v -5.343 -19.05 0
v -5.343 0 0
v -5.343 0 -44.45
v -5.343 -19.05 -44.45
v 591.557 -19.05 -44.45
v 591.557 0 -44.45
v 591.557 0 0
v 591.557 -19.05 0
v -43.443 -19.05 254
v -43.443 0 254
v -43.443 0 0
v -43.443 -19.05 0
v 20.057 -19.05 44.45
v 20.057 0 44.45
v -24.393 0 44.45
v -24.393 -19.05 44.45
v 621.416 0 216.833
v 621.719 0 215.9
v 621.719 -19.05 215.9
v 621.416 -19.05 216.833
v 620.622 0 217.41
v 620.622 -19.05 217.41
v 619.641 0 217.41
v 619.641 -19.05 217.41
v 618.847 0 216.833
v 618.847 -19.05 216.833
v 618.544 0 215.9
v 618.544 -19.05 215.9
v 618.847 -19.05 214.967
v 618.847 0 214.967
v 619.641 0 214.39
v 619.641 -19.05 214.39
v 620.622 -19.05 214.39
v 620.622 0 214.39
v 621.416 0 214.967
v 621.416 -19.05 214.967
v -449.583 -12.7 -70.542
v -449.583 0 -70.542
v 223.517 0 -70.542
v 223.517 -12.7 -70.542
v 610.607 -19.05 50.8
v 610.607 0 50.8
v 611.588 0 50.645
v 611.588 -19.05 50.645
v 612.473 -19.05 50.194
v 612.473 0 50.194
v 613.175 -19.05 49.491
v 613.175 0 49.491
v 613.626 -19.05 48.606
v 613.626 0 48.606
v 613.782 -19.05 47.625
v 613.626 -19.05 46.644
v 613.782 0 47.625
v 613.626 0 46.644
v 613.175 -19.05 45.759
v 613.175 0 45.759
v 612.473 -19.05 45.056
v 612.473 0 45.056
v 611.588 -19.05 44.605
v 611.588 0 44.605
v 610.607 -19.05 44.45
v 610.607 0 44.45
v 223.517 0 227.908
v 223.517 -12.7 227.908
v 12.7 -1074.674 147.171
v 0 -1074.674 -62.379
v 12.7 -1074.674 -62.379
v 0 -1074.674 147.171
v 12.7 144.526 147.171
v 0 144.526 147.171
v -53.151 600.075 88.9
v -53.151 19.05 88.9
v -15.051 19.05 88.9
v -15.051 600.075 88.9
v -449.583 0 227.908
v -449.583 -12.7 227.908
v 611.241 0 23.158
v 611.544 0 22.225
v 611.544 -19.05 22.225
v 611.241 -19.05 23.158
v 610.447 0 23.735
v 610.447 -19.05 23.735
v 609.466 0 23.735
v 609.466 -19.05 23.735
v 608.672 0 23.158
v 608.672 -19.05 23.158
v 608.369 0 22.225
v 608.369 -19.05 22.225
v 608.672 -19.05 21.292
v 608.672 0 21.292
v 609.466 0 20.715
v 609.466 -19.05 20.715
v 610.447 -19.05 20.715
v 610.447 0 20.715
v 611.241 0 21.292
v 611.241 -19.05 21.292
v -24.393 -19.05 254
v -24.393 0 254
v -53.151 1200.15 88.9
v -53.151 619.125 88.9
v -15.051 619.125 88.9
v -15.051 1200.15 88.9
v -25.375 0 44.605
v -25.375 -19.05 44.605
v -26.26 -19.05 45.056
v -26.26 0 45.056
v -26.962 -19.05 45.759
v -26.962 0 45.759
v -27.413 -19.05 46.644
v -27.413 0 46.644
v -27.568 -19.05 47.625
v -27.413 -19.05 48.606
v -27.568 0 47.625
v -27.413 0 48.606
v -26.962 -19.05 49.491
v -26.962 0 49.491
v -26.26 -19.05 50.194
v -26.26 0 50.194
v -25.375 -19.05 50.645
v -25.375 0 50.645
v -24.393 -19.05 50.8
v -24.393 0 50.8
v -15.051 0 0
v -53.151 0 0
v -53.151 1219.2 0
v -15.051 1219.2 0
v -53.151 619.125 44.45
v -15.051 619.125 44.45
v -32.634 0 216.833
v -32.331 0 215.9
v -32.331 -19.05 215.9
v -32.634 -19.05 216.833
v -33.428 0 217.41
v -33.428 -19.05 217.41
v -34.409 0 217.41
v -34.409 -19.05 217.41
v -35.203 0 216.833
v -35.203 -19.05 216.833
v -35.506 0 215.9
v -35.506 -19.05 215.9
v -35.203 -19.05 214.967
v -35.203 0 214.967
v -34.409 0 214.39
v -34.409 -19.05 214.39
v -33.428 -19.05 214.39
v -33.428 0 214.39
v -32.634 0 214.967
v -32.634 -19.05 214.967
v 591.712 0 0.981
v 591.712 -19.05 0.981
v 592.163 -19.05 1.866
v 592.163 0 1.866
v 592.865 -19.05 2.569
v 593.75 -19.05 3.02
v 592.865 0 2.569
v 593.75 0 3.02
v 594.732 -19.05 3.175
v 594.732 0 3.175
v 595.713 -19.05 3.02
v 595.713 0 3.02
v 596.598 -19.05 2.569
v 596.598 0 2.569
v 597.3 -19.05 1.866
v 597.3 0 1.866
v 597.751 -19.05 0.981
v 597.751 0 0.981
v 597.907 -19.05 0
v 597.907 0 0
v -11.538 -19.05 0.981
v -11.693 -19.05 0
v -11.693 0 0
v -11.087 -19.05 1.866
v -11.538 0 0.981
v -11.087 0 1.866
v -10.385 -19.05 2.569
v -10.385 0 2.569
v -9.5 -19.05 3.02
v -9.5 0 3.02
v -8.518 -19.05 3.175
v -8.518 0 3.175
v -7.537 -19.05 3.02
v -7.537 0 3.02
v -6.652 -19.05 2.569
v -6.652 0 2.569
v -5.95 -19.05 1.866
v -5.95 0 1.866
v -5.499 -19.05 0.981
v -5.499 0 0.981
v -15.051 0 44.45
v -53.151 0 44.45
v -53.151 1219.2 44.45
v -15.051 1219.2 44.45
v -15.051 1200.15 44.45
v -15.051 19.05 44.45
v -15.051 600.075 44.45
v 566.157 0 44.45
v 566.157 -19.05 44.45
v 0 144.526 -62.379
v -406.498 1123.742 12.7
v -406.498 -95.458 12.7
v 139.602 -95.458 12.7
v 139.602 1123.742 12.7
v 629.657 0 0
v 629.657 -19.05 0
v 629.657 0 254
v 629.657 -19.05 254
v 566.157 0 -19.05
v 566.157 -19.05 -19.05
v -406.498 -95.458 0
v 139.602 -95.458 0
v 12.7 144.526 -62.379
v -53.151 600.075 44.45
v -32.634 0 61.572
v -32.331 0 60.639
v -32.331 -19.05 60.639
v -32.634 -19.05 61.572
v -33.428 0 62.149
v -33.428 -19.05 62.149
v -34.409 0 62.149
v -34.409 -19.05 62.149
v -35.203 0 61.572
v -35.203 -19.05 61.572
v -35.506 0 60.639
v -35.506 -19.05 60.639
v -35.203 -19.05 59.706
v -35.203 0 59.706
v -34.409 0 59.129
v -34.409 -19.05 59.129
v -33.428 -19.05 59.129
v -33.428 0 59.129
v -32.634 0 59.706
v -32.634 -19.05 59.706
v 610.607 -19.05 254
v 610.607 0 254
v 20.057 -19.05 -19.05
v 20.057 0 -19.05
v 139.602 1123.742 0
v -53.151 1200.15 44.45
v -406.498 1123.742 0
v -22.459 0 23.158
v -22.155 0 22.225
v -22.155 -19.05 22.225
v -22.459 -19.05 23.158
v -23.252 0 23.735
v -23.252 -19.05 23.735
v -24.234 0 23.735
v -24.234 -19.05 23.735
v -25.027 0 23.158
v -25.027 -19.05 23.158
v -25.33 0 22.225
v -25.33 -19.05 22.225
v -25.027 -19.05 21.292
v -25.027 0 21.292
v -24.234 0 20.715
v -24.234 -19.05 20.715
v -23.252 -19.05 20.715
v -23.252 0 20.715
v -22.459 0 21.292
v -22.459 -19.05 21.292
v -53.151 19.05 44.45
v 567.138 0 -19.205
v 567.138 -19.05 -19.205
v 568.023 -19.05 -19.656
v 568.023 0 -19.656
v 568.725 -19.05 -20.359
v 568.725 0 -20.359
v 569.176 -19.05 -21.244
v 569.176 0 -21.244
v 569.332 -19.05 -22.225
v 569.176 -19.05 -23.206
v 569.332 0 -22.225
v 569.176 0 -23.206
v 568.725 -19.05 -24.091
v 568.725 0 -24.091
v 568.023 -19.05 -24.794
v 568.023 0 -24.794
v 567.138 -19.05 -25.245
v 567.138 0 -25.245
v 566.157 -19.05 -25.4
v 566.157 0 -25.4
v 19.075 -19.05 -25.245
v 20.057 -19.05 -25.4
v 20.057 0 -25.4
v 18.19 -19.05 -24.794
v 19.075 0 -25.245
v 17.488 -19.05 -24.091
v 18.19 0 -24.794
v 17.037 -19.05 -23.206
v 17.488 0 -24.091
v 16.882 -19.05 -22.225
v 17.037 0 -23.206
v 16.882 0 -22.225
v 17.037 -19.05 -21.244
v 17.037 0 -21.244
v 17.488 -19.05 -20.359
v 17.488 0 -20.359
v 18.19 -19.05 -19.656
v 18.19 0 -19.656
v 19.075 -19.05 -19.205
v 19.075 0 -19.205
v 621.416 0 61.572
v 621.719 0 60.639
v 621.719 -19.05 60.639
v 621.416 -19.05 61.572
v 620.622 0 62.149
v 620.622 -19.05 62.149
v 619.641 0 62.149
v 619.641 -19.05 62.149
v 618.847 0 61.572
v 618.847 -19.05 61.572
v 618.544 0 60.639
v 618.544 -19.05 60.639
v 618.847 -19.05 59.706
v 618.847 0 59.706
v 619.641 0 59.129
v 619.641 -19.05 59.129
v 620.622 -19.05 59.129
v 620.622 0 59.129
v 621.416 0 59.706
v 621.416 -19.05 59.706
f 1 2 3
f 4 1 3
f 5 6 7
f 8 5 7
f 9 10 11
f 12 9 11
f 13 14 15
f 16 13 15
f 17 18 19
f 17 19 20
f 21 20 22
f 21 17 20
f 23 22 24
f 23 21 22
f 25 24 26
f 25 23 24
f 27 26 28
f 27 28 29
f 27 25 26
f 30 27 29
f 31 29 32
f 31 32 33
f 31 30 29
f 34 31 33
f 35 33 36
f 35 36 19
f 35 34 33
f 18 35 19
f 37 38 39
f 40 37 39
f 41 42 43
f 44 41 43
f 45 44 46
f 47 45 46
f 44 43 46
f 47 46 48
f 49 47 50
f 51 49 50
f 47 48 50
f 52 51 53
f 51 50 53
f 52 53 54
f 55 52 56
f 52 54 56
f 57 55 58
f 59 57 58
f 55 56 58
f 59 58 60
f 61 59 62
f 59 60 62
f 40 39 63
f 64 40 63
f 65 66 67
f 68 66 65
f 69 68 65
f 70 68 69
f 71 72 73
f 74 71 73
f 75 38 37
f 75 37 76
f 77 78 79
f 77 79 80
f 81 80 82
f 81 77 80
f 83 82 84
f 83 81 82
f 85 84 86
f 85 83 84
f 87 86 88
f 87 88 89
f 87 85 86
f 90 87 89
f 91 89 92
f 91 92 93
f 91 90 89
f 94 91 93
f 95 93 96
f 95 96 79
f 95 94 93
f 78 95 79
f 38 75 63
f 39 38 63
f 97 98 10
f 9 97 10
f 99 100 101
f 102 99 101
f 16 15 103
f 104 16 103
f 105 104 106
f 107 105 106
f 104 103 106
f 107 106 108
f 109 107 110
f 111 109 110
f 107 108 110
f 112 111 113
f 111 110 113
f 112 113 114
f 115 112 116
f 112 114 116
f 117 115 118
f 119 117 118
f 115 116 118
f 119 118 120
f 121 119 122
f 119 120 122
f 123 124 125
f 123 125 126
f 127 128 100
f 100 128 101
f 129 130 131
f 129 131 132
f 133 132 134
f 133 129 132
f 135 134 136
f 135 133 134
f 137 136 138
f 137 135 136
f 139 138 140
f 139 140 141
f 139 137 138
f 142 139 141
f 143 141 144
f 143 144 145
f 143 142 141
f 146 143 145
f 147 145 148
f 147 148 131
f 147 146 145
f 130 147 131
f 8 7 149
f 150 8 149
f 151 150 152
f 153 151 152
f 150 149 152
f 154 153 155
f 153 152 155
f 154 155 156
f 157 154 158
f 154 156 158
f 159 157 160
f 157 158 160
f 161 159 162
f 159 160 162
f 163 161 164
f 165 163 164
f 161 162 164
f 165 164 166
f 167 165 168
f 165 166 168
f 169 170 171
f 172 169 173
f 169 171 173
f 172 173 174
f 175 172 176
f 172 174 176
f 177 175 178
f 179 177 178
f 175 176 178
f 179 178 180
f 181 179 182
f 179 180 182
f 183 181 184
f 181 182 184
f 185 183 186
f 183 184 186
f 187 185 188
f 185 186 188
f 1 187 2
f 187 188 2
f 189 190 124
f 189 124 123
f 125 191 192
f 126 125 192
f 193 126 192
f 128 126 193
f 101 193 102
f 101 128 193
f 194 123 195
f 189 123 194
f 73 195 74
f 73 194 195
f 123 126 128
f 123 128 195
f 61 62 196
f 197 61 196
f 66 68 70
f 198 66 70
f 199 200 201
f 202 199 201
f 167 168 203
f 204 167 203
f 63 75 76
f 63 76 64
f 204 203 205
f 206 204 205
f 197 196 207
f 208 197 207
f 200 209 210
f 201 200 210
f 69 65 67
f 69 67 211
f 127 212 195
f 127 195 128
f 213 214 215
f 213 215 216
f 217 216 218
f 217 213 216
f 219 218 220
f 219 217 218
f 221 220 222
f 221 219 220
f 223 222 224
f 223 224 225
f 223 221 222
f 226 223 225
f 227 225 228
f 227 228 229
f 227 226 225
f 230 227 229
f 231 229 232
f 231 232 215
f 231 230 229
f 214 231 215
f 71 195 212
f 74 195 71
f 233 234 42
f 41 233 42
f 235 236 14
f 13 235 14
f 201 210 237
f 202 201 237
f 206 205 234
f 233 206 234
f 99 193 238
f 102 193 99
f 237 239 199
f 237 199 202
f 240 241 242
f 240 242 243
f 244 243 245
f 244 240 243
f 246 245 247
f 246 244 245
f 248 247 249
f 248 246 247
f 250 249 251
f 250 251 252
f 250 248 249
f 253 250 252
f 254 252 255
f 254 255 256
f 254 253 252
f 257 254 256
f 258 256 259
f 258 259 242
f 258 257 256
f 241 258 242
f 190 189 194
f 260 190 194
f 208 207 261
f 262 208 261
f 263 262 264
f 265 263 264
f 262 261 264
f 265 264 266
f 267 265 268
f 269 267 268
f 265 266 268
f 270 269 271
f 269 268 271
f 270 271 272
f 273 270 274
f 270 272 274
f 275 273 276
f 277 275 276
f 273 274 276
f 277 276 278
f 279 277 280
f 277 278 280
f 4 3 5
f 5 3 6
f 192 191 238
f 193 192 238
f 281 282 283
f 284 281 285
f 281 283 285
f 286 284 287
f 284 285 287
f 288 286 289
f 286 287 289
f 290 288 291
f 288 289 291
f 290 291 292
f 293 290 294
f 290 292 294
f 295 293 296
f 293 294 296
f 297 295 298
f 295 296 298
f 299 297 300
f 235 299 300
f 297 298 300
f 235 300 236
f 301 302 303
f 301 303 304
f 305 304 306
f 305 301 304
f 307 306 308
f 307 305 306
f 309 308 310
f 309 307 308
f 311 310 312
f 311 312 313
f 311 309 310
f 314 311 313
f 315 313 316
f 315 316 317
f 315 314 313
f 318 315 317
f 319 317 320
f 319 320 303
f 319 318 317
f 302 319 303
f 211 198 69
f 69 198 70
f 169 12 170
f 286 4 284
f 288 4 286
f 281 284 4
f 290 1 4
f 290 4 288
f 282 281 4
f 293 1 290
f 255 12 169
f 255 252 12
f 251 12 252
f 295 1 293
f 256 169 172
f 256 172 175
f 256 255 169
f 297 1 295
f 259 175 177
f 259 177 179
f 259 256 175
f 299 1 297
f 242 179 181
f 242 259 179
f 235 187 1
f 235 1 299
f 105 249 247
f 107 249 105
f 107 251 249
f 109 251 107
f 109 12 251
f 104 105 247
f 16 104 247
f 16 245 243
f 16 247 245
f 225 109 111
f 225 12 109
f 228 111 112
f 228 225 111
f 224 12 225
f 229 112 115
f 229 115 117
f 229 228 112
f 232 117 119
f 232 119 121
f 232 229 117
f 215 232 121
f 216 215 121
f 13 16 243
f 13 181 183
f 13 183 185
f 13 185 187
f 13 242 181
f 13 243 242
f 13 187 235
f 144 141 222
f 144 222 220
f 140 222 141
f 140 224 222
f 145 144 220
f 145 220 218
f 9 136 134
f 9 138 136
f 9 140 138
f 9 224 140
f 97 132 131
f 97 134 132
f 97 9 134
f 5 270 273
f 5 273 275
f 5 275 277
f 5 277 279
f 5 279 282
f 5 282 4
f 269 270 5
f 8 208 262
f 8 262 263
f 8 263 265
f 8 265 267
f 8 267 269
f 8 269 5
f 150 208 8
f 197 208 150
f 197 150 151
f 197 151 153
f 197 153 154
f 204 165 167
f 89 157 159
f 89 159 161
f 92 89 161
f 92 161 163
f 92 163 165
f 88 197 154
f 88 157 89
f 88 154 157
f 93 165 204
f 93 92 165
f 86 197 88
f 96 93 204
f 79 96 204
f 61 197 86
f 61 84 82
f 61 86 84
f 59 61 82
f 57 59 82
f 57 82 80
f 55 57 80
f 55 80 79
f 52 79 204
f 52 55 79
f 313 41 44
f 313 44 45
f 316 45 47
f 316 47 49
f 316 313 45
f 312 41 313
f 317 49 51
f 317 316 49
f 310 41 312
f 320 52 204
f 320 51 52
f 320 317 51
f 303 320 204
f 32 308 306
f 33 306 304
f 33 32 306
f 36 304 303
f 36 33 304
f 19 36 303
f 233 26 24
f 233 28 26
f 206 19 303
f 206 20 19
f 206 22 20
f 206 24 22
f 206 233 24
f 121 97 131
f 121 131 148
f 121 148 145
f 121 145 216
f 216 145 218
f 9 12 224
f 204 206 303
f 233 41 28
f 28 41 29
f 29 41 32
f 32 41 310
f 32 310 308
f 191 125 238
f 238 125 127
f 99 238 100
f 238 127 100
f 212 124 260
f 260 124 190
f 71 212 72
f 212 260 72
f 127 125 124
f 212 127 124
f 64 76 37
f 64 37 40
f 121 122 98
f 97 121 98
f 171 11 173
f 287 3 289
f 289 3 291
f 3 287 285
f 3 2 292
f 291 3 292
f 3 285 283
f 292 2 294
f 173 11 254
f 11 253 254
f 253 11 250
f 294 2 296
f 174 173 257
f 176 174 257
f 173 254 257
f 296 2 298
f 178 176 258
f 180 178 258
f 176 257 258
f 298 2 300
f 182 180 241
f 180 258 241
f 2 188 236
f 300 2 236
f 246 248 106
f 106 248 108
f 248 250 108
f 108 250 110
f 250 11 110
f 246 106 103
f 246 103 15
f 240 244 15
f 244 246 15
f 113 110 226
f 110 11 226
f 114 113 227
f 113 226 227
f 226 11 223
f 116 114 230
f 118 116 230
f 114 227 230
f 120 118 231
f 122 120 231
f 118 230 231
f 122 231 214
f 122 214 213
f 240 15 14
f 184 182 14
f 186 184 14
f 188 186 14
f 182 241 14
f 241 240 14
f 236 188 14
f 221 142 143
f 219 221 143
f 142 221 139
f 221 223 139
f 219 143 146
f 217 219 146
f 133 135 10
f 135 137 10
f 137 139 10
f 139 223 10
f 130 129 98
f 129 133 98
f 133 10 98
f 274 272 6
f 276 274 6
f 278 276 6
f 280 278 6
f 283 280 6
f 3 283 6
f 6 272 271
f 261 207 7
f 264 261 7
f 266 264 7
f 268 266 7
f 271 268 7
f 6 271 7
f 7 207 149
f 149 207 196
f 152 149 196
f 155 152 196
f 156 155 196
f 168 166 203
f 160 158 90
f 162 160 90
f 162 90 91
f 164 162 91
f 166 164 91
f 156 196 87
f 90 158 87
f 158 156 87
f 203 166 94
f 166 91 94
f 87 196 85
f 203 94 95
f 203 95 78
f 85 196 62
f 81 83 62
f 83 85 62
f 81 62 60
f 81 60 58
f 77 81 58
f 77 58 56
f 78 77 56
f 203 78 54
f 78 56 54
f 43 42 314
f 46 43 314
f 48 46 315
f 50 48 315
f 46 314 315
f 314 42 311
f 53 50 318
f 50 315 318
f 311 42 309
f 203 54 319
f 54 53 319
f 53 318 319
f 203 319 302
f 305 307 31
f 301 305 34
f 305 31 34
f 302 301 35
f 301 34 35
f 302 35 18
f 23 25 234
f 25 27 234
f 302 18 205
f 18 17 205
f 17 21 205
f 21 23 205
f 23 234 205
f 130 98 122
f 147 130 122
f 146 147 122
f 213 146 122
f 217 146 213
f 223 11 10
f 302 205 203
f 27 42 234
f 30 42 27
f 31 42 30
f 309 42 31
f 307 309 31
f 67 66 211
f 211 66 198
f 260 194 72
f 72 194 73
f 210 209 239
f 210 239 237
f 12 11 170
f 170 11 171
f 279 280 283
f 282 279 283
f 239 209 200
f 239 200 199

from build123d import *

# Parameters (mm, degrees)
F0_R      = 1.5875
F1_DEPTH  = 19.05
F2_W      = 38.1
F2_H      = 88.9
F3_DEPTH  = 1219.2
F4_W      = 19.05
F4_H      = 44.45
F5_DEPTH  = 50.8
F7_W      = 19.05
F7_H      = 44.45
F8_DEPTH  = 50.8
F9_W      = 673.1
F9_H      = 298.45
F10_DEPTH = 12.7
F11_W     = 1219.2
F11_H     = 209.55
F12_DEPTH = 12.7
F13_W     = 546.1
F13_H     = 1219.2
F14_DEPTH = 12.7


# Not quite as in the source:
# - a pattern or mirror of a feature is missing from the dataset's text; its kind, count and spacing are read off the source's solid


with BuildPart() as f1:
    # F0 (on Front) → F1 (new body)
    with BuildSketch(Plane.XZ):
        with BuildLine():
            Line((-5.3433722377, 44.45), (-24.3933722377, 44.45))
            ThreePointArc((-24.3933722377, 44.45), (-27.5683722377, 47.625), (-24.3933722377, 50.8))
            Line((-24.3933722377, 50.8), (-24.3933722377, 254))
            Line((-24.3933722377, 254), (-43.4433722377, 254))
            Line((-43.4433722377, 254), (-43.4433722377, 44.45))
            Line((-43.4433722377, 44.45), (-43.4433722377, 0))
            Line((-43.4433722377, 0), (-11.6933722377, 0))
            ThreePointArc((-11.6933722377, 0), (-8.5183722377, 3.175), (-5.3433722377, 0))
            Line((-5.3433722377, 0), (-5.3433722377, -44.45))
            Line((-5.3433722377, -44.45), (293.1066277623, -44.45))
            Line((293.1066277623, -44.45), (591.5566277623, -44.45))
            Line((591.5566277623, -44.45), (591.5566277623, 0))
            ThreePointArc((591.5566277623, 0), (594.7316277623, 3.175), (597.9066277623, 0))
            Line((597.9066277623, 0), (629.6566277623, 0))
            Line((629.6566277623, 0), (629.6566277623, 44.45))
            Line((629.6566277623, 44.45), (629.6566277623, 254))
            Line((629.6566277623, 254), (610.6066277623, 254))
            Line((610.6066277623, 254), (610.6066277623, 50.8))
            ThreePointArc((610.6066277623, 50.8), (613.7816277623, 47.625), (610.6066277623, 44.45))
            Line((610.6066277623, 44.45), (591.5566277623, 44.45))
            Line((591.5566277623, 44.45), (566.1566277623, 44.45))
            Line((566.1566277623, 44.45), (566.1566277623, -19.05))
            ThreePointArc((566.1566277623, -19.05), (569.3316277623, -22.225), (566.1566277623, -25.4))
            Line((566.1566277623, -25.4), (293.1066277623, -25.4))
            Line((293.1066277623, -25.4), (20.0566277623, -25.4))
            ThreePointArc((20.0566277623, -25.4), (16.8816277623, -22.225), (20.0566277623, -19.05))
            Line((20.0566277623, -19.05), (20.0566277623, 44.45))
            Line((20.0566277623, 44.45), (-5.3433722377, 44.45))
        make_face()
        with Locations((-23.7429365516, 22.225)):
            Circle(F0_R, mode=Mode.SUBTRACT)
        with Locations((-33.9183722377, 60.6392584741)):
            Circle(F0_R, mode=Mode.SUBTRACT)
        with Locations((609.9561920762, 22.225)):
            Circle(F0_R, mode=Mode.SUBTRACT)
        with Locations((620.1316277623, 60.6392584741)):
            Circle(F0_R, mode=Mode.SUBTRACT)
        with Locations((-33.9183722377, 215.9)):
            Circle(F0_R, mode=Mode.SUBTRACT)
        with Locations((620.1316277623, 215.9)):
            Circle(F0_R, mode=Mode.SUBTRACT)
    extrude(amount=F1_DEPTH)


with BuildPart() as f3:
    # F2 (on Front) → F3 (new body)
    with BuildSketch(Plane.XZ):
        with Locations((-34.1012573361, 44.45)):
            Rectangle(F2_W, F2_H)
    extrude(amount=-F3_DEPTH)

    # F4 (on face) → F5 (cut)
    with BuildSketch(Plane.YZ.offset(-15.0512573361)):
        with Locations((9.525, 66.675)):
            Rectangle(F4_W, F4_H)
    f5 = extrude(amount=-F5_DEPTH, mode=Mode.SUBTRACT)

    # F5_copies: F5 across plane
    add(f5.mirror(Plane.ZX.offset(609.6)), mode=Mode.SUBTRACT)

    # F7 (on face) → F8 (cut)
    with BuildSketch(Plane.YZ.offset(-15.0512573361)):
        with Locations((609.6, 66.675)):
            Rectangle(F7_W, F7_H)
    extrude(amount=-F8_DEPTH, mode=Mode.SUBTRACT)


with BuildPart() as f10:
    # F9 (on Front) → F10 (new body)
    with BuildSketch(Plane.XZ):
        with Locations((-113.032694068, 78.6825154781)):
            Rectangle(F9_W, F9_H)
    extrude(amount=F10_DEPTH)


with BuildPart() as f12:
    # F11 (on Right) → F12 (new body)
    with BuildSketch(Plane.YZ):
        with Locations((-465.0740548134, 42.3955094159)):
            Rectangle(F11_W, F11_H)
    extrude(amount=F12_DEPTH)


with BuildPart() as f14:
    # F13 (on Top) → F14 (new body)
    with BuildSketch(Plane.XY):
        with Locations((-133.4478157043, 514.1422971249)):
            Rectangle(F13_W, F13_H)
    extrude(amount=F14_DEPTH)


solid = Compound([f1.part, f3.part, f10.part, f12.part, f14.part])
